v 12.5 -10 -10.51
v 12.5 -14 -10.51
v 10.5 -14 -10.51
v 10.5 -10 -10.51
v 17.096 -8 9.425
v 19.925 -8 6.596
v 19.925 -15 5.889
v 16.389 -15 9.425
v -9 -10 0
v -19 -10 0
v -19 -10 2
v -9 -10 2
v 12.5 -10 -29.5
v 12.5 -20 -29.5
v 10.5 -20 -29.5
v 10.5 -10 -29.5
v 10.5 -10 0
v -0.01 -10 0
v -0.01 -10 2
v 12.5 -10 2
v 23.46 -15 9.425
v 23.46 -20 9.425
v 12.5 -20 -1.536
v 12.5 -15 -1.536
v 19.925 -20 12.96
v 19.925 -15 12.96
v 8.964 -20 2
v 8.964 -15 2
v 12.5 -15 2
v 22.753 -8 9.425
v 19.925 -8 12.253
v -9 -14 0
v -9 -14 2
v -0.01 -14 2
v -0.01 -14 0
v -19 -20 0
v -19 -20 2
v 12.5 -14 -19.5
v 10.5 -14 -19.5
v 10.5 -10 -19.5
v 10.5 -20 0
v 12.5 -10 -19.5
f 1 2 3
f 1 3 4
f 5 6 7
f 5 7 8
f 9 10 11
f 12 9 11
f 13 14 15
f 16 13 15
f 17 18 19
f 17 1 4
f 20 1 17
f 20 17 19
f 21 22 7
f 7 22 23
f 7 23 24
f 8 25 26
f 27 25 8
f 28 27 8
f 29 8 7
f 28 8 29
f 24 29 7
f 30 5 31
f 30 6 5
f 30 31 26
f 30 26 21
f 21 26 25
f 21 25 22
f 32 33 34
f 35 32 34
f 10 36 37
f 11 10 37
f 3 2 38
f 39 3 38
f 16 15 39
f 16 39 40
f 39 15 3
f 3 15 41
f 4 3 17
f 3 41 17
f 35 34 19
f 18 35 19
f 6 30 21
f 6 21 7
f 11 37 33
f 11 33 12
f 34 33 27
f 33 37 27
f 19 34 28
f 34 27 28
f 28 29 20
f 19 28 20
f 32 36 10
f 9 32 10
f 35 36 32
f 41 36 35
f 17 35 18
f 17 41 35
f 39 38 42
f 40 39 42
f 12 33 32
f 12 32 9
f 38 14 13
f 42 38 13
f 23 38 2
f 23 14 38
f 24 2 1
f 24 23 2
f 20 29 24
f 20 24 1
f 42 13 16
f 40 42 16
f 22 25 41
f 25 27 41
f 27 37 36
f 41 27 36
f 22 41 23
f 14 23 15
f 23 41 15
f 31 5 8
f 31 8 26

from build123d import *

# Parameters (mm, degrees)
SKETCH2_W           = 10.5
SKETCH2_H           = 10
BOSS_EXTRUDE1_DEPTH = 2
SKETCH3_W           = 2
SKETCH3_H           = 10
BOSS_EXTRUDE2_DEPTH = 2
SKETCH4_W           = 2
SKETCH4_H           = 10
BOSS_EXTRUDE3_DEPTH = 10.5
SKETCH18_W          = 2
SKETCH18_H          = 10
BOSS_EXTRUDE6_DEPTH = 19
SKETCH19_W          = 8.99
SKETCH19_H          = 5
CUT_EXTRUDE1_DEPTH  = 19
SKETCH20_W          = 2
SKETCH20_H          = 10
BOSS_EXTRUDE7_DEPTH = 19
SKETCH21_W          = 8.99
SKETCH21_H          = 5
CUT_EXTRUDE2_DEPTH  = 19
BOSS_EXTRUDE8_REACH = 54.114
SKETCH22_W          = 5
SKETCH22_H          = 5
SKETCH23_W          = 5
SKETCH23_H          = 5
BOSS_EXTRUDE9_DEPTH = 10
LOFT1_DEPTH         = 7
LOFT1_DRAFT         = 4.0856168


# Read off the part's stored shape, not the designer's step: Loft1
with BuildPart() as part:
    # Sketch2 → Boss-Extrude1 (new body)
    with BuildSketch(Plane.XY):
        with Locations((5.25, -15)):
            Rectangle(SKETCH2_W, SKETCH2_H)
    extrude(amount=BOSS_EXTRUDE1_DEPTH)

    # Sketch3 → Boss-Extrude2 (add)
    with BuildSketch(Plane(origin=(10.5, 0, 0), x_dir=(0, 0, -1), z_dir=(1, 0, 0))):
        with Locations((-1, -15)):
            Rectangle(SKETCH3_W, SKETCH3_H)
    extrude(amount=BOSS_EXTRUDE2_DEPTH)

    # Sketch4 → Boss-Extrude3 (add)
    with BuildSketch(Plane(origin=(0, 0, 0), x_dir=(-1, 0, 0), z_dir=(0, 0, -1))):
        with Locations((-11.5, -15)):
            Rectangle(SKETCH4_W, SKETCH4_H)
    extrude(amount=BOSS_EXTRUDE3_DEPTH)

    # Sketch18 → Boss-Extrude6 (add)
    with BuildSketch(Plane(origin=(0, 0, -10.5), x_dir=(-1, 0, 0), z_dir=(0, 0, -1))):
        with Locations((-11.5, -15)):
            Rectangle(SKETCH18_W, SKETCH18_H)
    extrude(amount=BOSS_EXTRUDE6_DEPTH)

    # Sketch19 → Cut-Extrude1 (cut)
    with BuildSketch(Plane(origin=(12.5, 0, 0), x_dir=(0, 0, -1), z_dir=(1, 0, 0))):
        with Locations((15.005, -11.5)):
            Rectangle(SKETCH19_W, SKETCH19_H)
    extrude(amount=-CUT_EXTRUDE1_DEPTH, mode=Mode.SUBTRACT)

    # Sketch20 → Boss-Extrude7 (add)
    with BuildSketch(Plane.ZY):
        with Locations((1, -15)):
            Rectangle(SKETCH20_W, SKETCH20_H)
    extrude(amount=BOSS_EXTRUDE7_DEPTH)

    # Sketch21 → Cut-Extrude2 (cut)
    with BuildSketch(Plane.XY.offset(2)):
        with Locations((-4.505, -11.5)):
            Rectangle(SKETCH21_W, SKETCH21_H)
    extrude(amount=-CUT_EXTRUDE2_DEPTH, mode=Mode.SUBTRACT)

    # Sketch22 → Boss-Extrude8 (add, up to next)
    with BuildSketch(Plane(origin=(9.371320344, 0, 9.371320344), x_dir=(0.7071067811865476, 0, -0.7071067811865476), z_dir=(0.7071067811865476, 0, 0.7071067811865476)), mode=Mode.PRIVATE) as boss_extrude8_sk1:
        with Locations((7.424621202, -17.5)):
            Rectangle(SKETCH22_W, SKETCH22_H)
    boss_extrude8_tool1 = extrude(boss_extrude8_sk1.sketch, amount=-BOSS_EXTRUDE8_REACH, mode=Mode.PRIVATE) - part.part
    add(boss_extrude8_tool1.solids().sort_by_distance((14.62132, -17.5, 4.12132))[0])

    # Sketch23 → Boss-Extrude9 (add)
    with BuildSketch(Plane(origin=(9.371320344, 0, 9.371320344), x_dir=(0.7071067811865475, 0, -0.7071067811865476), z_dir=(0.7071067811865476, 0, 0.7071067811865475))):
        with Locations((7.424621202, -17.5)):
            Rectangle(SKETCH23_W, SKETCH23_H)
    extrude(amount=BOSS_EXTRUDE9_DEPTH)


with BuildPart() as loft1_tool:
    # Loft1 outline → Loft1 (with draft: the straight prism first)
    with BuildSketch(Plane(origin=(0, -8, 0), x_dir=(1, 0, 0), z_dir=(0, 1, 0))):
        Polygon((17.096194078, -9.424621202), (19.924621202, -12.253048327), (22.753048327, -9.424621202), (19.924621202, -6.596194078), align=None)
    extrude(amount=-LOFT1_DEPTH)
    # Loft1: the draft: its side faces are tilted about the plane it starts from
    loft1_sides = [loft1_tool.faces().sort_by_distance(p)[0] for p in [
        (18.51040764, -11.5, 10.838834765),
        (21.338834764, -11.5, 10.838834764),
        (21.338834764, -11.5, 8.01040764),
        (18.51040764, -11.5, 8.01040764),
    ]]
    draft(loft1_sides, Plane(origin=(0, -8, 0), x_dir=(1, 0, 0), z_dir=(0, 1, 0)), LOFT1_DRAFT)


with BuildPart() as part_1:
    add(part.part)

    # Loft1: add loft1_tool
    add(loft1_tool.part)


solid = part_1.part
